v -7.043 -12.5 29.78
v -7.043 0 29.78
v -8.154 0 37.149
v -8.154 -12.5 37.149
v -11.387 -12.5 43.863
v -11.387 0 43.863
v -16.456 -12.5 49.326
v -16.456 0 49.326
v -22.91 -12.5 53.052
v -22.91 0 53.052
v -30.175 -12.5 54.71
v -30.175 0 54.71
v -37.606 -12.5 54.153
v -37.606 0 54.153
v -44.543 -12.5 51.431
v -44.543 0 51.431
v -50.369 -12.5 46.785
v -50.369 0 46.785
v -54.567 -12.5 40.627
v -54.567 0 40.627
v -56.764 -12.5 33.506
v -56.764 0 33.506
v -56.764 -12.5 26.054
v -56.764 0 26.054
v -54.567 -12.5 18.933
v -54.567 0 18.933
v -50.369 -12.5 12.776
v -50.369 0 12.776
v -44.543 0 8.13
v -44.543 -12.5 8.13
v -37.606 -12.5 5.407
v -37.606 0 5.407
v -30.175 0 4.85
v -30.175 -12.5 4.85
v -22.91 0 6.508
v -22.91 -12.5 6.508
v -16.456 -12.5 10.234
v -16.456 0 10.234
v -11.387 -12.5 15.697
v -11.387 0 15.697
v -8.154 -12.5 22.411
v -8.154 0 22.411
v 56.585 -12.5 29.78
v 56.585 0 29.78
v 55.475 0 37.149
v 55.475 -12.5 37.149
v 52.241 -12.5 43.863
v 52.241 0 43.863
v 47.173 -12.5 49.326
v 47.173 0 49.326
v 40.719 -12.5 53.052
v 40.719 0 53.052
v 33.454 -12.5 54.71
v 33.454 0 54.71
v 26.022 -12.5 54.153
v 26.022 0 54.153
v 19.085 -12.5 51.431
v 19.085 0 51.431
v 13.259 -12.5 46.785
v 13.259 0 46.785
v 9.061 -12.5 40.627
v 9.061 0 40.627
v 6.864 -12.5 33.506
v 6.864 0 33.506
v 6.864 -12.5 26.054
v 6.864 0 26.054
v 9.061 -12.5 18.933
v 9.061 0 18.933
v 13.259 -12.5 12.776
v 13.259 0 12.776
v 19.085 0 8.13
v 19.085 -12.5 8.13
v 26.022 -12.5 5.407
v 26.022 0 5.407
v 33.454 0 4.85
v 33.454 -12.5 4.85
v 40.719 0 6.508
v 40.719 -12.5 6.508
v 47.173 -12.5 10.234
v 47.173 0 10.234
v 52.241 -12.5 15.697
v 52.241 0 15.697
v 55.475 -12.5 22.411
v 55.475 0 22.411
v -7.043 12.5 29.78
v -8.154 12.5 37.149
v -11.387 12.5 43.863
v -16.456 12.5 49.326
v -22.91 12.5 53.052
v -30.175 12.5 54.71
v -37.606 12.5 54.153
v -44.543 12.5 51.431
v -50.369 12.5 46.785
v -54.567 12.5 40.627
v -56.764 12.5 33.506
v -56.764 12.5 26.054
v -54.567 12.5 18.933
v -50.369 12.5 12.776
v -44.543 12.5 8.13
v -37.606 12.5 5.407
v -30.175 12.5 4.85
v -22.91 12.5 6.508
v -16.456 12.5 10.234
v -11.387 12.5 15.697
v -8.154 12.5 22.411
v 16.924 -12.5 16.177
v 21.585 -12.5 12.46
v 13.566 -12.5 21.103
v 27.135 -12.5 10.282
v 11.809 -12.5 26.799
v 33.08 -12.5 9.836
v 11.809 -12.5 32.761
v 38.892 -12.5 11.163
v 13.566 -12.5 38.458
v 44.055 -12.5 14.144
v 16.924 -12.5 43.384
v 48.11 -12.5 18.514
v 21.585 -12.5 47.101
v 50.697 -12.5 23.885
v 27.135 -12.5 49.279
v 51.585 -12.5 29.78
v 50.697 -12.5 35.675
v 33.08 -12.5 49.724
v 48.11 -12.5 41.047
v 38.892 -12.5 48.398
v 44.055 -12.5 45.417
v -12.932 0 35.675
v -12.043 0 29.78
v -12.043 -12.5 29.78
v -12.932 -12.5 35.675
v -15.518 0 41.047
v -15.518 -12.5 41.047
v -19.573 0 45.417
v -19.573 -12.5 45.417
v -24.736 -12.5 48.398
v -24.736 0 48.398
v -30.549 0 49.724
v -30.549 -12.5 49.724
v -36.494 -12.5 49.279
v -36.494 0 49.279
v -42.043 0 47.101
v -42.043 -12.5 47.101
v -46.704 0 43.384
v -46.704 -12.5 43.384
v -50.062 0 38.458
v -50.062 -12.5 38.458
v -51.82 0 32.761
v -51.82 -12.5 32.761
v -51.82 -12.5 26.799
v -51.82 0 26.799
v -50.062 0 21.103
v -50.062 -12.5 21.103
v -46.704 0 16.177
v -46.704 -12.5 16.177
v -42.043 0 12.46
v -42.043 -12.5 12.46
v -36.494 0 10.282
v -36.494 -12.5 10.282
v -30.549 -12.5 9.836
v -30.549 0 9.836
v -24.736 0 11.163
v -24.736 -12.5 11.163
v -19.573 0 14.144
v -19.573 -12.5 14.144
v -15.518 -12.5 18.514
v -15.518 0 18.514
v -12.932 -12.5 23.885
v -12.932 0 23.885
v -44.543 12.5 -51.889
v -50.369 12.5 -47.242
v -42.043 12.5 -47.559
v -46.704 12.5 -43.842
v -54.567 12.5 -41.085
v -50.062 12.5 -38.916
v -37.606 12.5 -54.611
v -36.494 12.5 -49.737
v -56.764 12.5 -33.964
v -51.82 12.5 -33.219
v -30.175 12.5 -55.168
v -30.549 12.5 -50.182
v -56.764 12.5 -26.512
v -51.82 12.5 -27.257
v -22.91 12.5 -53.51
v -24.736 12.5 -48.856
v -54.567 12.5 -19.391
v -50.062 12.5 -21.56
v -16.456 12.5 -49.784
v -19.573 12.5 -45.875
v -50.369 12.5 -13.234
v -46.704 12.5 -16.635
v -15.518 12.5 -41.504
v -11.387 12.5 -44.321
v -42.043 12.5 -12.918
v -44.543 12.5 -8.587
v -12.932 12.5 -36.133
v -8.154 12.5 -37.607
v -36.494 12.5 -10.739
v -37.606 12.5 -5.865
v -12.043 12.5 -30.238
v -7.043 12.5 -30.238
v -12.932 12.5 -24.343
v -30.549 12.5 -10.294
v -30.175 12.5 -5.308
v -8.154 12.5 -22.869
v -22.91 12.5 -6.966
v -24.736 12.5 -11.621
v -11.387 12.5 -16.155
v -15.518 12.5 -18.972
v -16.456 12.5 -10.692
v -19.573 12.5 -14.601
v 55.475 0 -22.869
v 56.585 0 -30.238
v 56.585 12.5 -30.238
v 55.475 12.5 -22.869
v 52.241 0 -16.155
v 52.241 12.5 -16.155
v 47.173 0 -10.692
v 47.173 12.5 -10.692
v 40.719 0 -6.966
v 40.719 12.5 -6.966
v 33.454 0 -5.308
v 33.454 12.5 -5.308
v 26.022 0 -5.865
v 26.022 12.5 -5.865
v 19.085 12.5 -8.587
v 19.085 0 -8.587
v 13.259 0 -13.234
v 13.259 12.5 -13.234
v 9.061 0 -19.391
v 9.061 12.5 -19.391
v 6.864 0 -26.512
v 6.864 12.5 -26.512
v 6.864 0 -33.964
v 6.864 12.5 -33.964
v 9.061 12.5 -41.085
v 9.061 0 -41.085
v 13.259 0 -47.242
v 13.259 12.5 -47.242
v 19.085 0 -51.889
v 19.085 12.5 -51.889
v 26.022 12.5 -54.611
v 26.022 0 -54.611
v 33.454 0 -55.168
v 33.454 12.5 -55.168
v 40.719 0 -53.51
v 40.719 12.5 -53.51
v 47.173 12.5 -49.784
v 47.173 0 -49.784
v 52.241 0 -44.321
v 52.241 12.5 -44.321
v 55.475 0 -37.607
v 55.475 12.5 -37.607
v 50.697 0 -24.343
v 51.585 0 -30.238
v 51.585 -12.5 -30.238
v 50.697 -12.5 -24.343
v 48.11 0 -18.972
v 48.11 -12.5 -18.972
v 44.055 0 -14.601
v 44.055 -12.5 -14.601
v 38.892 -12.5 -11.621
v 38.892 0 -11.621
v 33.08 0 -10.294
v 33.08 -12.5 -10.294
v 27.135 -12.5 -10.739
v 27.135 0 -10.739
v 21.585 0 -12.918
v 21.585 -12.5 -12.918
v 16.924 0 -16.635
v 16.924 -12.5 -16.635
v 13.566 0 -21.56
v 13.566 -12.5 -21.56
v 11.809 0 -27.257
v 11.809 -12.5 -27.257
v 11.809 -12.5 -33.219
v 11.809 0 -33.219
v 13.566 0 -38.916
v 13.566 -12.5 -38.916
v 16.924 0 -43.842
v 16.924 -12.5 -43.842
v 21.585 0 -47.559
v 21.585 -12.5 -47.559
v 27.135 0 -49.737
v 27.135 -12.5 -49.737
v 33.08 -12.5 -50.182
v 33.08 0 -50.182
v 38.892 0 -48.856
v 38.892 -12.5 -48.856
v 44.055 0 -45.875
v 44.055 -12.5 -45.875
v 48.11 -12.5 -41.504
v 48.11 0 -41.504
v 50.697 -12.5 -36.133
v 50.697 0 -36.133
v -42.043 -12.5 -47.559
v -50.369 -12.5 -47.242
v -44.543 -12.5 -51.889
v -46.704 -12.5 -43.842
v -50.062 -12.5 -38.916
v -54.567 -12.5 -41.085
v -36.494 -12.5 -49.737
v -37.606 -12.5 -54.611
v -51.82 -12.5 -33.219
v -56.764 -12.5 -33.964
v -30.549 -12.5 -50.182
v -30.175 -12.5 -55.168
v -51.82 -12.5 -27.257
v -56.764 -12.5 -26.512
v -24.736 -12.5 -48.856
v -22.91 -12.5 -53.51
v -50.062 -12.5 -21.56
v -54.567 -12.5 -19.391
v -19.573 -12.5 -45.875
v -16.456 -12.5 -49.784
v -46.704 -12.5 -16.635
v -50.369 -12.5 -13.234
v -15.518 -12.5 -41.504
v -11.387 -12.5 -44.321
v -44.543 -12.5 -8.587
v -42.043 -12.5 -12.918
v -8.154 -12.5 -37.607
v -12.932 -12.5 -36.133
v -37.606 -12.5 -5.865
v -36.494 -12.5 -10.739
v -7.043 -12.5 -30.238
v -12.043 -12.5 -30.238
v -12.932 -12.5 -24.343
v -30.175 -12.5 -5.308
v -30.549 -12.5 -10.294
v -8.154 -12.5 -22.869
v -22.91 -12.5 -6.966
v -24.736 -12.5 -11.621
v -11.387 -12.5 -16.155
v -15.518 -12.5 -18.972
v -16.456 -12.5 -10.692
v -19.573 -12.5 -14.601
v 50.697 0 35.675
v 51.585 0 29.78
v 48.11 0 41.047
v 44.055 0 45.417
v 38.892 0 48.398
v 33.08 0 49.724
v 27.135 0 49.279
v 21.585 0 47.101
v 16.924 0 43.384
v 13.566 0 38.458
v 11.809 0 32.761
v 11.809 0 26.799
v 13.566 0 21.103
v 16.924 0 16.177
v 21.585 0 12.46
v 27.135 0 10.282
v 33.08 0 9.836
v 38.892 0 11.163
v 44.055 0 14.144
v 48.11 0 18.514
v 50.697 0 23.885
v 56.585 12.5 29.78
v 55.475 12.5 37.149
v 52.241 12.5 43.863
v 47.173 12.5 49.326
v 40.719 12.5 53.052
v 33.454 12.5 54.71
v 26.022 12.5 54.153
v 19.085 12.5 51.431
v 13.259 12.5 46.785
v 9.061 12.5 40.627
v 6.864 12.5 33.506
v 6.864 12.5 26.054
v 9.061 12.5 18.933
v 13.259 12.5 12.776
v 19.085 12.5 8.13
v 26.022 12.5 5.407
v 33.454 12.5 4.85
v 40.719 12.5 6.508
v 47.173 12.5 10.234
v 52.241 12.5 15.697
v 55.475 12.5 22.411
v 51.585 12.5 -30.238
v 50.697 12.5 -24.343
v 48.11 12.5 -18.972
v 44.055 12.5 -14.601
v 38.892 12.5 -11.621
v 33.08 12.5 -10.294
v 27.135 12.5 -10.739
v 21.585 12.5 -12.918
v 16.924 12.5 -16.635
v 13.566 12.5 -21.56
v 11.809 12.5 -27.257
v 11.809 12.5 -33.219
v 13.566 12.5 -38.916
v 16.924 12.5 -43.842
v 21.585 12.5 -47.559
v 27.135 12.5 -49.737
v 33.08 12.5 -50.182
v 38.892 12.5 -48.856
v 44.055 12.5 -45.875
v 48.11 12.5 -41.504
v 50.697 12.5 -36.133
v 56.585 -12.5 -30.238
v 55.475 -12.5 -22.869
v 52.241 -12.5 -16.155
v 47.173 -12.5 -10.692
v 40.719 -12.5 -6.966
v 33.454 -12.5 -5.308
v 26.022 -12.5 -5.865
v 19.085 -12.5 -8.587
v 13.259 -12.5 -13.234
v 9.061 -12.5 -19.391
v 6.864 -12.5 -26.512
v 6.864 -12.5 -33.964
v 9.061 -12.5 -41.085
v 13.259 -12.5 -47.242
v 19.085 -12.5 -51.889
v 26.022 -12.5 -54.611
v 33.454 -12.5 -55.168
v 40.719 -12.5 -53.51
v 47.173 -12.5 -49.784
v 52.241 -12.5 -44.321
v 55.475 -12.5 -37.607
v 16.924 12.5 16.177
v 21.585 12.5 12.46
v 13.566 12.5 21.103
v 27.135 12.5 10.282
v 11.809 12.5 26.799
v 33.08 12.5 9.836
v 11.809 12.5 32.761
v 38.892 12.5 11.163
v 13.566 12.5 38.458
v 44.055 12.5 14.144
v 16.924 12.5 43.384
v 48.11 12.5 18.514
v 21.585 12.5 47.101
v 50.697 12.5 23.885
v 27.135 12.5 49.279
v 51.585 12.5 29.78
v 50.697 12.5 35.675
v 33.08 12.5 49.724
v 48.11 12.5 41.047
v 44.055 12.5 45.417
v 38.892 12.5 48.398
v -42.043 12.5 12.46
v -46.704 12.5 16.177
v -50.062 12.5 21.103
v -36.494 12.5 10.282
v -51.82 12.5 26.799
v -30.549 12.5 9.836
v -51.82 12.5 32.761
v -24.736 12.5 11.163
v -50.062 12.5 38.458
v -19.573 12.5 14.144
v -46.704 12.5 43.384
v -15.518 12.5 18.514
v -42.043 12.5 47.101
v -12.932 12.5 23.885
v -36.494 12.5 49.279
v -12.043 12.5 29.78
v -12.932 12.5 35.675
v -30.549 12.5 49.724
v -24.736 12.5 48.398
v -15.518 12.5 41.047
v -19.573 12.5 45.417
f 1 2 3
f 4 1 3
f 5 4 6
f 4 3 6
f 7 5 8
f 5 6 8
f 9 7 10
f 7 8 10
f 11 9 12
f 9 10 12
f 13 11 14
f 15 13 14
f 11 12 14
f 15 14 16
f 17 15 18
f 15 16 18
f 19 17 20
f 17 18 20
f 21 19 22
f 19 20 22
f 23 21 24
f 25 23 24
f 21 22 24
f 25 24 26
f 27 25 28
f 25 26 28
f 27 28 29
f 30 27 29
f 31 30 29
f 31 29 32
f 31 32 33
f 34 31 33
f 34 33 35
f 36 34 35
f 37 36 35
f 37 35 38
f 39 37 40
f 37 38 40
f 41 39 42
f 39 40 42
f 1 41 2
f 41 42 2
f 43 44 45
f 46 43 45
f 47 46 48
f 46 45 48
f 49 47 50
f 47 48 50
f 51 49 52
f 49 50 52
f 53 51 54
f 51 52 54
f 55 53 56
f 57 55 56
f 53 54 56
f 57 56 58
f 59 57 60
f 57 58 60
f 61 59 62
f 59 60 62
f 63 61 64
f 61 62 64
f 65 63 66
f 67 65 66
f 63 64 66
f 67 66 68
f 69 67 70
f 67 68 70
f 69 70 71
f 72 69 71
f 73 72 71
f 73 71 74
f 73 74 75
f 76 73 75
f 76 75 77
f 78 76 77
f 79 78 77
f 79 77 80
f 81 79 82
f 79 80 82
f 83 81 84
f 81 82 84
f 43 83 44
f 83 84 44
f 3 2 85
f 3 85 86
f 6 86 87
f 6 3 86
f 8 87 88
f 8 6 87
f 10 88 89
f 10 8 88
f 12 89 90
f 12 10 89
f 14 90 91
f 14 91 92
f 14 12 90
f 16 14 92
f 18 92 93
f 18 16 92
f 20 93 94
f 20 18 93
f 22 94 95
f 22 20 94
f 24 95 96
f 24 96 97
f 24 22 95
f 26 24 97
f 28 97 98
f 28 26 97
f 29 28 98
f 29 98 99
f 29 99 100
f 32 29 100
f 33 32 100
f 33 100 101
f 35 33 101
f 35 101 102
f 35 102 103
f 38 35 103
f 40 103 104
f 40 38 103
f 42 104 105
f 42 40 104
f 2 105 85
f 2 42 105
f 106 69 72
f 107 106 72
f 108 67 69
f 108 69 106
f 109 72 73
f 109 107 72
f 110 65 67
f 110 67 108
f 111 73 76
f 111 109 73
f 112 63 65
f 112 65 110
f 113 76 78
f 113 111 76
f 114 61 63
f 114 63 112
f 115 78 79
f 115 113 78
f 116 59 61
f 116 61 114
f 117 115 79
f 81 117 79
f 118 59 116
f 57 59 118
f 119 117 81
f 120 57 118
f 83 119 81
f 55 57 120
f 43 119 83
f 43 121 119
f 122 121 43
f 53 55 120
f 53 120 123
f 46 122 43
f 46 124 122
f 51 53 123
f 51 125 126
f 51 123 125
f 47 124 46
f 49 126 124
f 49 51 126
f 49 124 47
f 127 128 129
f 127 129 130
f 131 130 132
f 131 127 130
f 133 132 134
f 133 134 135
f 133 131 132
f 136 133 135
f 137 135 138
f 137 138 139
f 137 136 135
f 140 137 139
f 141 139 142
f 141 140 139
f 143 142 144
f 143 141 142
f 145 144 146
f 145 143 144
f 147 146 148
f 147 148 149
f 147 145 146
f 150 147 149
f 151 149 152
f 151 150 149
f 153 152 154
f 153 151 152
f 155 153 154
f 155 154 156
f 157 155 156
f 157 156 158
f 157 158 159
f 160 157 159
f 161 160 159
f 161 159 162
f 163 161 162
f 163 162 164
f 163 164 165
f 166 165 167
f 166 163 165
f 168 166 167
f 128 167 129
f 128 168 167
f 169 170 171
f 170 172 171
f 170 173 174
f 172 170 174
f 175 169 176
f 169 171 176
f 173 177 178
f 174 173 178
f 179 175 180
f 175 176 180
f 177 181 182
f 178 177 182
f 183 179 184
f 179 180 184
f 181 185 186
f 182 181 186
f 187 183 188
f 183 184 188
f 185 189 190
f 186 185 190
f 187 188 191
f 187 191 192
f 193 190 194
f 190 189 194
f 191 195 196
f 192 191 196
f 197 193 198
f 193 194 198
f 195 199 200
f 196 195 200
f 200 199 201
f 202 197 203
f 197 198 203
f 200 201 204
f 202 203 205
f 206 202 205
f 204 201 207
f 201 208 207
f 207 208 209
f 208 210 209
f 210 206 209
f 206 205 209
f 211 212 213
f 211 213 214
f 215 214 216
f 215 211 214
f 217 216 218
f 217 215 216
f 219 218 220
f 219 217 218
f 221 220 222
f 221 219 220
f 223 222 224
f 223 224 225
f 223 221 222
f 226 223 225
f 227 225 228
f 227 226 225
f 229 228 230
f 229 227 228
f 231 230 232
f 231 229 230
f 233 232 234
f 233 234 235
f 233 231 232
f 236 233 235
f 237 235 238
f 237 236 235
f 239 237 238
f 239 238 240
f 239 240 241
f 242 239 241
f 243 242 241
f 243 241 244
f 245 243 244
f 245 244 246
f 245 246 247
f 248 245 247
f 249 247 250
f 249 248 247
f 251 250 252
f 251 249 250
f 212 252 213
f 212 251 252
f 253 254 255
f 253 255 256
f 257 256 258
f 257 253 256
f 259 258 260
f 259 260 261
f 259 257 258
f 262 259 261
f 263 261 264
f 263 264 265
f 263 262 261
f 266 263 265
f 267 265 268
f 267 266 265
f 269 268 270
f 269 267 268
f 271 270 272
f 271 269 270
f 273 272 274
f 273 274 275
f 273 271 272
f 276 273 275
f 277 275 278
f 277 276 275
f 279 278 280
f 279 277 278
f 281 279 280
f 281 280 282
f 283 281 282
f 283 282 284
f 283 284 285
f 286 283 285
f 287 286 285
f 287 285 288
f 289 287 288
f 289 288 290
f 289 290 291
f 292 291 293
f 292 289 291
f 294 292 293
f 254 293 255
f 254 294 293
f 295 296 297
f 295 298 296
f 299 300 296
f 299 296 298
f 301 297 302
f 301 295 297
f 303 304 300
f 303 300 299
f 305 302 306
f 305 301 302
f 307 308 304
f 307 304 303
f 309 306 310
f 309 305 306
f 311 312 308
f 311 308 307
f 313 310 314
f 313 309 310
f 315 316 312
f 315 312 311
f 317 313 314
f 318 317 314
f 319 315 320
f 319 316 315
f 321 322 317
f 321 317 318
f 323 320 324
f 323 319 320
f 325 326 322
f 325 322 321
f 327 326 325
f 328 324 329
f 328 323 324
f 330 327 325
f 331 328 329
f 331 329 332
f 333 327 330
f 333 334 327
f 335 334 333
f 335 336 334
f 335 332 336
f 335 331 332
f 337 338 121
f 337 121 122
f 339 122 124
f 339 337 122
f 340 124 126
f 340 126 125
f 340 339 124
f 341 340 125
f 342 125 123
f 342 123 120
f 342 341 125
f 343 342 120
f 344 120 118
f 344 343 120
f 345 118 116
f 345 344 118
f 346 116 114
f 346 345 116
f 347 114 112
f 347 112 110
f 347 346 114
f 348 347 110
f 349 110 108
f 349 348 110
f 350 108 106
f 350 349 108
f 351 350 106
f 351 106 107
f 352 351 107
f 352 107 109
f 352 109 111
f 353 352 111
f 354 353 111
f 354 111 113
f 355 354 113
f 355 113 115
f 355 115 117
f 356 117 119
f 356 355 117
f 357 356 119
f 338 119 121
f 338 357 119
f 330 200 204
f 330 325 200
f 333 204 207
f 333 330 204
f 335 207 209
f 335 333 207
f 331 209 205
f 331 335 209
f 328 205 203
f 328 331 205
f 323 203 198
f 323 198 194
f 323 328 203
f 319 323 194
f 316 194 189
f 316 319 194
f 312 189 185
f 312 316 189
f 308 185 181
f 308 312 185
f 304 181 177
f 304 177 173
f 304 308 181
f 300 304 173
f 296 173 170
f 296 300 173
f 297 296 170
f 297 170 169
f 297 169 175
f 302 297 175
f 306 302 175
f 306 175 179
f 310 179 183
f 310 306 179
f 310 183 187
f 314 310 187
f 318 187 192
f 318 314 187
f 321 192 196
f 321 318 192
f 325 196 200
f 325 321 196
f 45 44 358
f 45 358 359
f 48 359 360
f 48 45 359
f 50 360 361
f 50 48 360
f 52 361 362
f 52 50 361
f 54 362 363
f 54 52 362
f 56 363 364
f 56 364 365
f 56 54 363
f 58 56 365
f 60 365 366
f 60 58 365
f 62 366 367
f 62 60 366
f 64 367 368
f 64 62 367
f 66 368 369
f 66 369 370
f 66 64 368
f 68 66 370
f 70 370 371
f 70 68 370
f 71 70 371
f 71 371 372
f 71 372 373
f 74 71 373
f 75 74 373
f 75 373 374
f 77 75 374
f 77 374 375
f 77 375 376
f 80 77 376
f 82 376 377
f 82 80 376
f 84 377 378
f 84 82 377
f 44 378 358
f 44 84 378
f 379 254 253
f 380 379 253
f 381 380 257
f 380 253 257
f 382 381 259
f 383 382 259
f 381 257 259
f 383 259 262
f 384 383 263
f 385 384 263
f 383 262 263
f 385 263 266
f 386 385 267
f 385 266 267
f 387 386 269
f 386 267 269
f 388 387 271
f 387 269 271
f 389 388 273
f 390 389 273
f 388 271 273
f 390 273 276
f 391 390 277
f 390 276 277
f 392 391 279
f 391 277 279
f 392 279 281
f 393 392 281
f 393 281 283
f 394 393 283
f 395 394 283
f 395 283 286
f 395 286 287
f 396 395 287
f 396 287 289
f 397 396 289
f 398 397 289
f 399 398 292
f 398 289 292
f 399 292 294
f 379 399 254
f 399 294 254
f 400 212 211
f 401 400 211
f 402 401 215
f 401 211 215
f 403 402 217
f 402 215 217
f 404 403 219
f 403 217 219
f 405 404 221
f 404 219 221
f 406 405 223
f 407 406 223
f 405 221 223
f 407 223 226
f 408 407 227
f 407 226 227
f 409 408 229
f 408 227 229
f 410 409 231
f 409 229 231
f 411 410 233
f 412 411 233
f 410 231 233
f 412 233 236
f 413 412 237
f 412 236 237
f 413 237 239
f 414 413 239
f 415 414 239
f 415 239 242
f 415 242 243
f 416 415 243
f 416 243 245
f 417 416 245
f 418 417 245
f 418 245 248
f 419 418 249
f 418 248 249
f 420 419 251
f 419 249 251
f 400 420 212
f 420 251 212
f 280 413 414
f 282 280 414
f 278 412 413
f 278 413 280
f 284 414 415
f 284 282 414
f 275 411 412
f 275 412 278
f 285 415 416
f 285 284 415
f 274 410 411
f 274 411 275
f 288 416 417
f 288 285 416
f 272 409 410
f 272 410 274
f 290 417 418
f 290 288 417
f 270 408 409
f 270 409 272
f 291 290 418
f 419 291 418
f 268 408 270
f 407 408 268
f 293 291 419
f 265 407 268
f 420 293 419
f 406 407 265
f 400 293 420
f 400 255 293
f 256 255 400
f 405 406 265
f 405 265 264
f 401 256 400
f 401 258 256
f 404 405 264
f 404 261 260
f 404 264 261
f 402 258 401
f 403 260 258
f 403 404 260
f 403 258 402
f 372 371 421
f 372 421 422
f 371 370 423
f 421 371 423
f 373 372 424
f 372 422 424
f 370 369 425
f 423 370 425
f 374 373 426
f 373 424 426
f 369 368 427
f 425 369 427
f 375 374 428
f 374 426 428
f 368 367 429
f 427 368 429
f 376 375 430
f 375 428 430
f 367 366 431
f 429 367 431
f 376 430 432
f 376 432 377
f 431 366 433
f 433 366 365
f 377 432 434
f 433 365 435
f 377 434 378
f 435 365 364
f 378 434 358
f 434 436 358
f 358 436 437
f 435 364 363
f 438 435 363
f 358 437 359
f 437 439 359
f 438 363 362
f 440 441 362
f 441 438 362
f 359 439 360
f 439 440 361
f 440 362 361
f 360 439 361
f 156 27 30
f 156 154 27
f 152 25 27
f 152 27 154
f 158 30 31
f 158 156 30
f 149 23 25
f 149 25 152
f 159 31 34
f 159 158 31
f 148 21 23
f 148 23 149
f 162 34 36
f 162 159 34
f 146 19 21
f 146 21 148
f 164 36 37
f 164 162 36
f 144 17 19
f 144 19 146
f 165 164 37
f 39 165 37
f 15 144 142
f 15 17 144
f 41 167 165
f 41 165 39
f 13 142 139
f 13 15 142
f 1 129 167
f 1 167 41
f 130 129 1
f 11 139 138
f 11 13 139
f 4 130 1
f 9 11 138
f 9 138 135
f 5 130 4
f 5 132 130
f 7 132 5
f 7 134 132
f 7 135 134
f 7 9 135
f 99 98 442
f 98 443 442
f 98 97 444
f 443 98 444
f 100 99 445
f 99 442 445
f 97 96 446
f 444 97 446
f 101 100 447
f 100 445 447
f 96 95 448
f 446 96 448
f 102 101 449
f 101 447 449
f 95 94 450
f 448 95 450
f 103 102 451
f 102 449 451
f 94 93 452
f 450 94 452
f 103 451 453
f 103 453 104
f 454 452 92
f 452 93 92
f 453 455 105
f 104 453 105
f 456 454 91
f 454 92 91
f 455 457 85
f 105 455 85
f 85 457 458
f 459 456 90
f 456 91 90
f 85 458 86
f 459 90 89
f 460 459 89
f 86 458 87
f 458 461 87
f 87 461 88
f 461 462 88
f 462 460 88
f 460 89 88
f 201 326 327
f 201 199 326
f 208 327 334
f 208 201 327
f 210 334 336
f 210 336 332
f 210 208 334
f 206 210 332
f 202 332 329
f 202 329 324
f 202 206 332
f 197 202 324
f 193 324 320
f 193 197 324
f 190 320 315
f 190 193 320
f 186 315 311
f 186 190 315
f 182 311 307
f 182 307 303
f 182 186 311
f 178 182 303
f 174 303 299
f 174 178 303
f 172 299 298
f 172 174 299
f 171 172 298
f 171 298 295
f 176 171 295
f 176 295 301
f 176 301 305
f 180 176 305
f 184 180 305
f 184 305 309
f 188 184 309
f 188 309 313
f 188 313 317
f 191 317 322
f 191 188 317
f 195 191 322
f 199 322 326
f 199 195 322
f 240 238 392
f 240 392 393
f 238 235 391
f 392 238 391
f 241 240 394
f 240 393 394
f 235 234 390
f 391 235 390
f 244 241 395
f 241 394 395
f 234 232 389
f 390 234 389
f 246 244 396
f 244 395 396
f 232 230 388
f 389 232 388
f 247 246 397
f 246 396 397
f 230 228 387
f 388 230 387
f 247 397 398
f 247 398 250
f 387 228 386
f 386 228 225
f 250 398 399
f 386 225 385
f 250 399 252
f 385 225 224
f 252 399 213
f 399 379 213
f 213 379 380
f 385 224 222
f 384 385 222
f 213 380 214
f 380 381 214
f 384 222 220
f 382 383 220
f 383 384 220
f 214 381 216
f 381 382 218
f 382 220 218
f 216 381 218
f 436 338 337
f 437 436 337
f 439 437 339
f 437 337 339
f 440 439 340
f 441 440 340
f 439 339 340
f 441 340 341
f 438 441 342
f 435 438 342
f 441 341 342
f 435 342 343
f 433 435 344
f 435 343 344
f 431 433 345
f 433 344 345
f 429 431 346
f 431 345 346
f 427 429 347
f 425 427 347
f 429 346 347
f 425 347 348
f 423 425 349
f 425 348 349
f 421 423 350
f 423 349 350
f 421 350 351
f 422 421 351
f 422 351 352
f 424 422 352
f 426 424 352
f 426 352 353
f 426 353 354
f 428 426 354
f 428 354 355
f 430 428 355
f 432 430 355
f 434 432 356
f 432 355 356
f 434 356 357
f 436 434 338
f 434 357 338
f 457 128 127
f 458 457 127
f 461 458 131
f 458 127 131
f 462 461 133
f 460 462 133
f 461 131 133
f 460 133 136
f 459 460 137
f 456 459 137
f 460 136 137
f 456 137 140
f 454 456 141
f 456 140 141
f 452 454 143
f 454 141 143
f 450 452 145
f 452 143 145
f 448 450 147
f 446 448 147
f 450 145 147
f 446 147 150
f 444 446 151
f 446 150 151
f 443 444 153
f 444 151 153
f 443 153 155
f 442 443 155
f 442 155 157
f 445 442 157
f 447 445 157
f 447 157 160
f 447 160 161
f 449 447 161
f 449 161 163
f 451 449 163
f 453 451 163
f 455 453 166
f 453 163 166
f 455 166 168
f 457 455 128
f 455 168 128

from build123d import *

# Parameters (mm, degrees)
F0_R     = 25
F0_R_2   = 20
F1_DEPTH = 12.5


with BuildPart() as f1:
    # F0 (on Front) → F1 (new body, symmetric)
    with BuildSketch(Plane.XZ):
        with Locations((-32.043104, 29.780199)):
            Circle(F0_R)
        with Locations((-32.043104, 29.780199)):
            Circle(F0_R_2, mode=Mode.SUBTRACT)
        with Locations((31.585259, 29.780199)):
            Circle(F0_R)
        with Locations((31.585259, 29.780199)):
            Circle(F0_R_2, mode=Mode.SUBTRACT)
        with Locations((31.585259, -30.238046)):
            Circle(F0_R)
        with Locations((31.585259, -30.238046)):
            Circle(F0_R_2, mode=Mode.SUBTRACT)
        with Locations((-32.043104, -30.238046)):
            Circle(F0_R)
        with Locations((-32.043104, -30.238046)):
            Circle(F0_R_2, mode=Mode.SUBTRACT)
    extrude(amount=F1_DEPTH, both=True)


solid = f1.part
